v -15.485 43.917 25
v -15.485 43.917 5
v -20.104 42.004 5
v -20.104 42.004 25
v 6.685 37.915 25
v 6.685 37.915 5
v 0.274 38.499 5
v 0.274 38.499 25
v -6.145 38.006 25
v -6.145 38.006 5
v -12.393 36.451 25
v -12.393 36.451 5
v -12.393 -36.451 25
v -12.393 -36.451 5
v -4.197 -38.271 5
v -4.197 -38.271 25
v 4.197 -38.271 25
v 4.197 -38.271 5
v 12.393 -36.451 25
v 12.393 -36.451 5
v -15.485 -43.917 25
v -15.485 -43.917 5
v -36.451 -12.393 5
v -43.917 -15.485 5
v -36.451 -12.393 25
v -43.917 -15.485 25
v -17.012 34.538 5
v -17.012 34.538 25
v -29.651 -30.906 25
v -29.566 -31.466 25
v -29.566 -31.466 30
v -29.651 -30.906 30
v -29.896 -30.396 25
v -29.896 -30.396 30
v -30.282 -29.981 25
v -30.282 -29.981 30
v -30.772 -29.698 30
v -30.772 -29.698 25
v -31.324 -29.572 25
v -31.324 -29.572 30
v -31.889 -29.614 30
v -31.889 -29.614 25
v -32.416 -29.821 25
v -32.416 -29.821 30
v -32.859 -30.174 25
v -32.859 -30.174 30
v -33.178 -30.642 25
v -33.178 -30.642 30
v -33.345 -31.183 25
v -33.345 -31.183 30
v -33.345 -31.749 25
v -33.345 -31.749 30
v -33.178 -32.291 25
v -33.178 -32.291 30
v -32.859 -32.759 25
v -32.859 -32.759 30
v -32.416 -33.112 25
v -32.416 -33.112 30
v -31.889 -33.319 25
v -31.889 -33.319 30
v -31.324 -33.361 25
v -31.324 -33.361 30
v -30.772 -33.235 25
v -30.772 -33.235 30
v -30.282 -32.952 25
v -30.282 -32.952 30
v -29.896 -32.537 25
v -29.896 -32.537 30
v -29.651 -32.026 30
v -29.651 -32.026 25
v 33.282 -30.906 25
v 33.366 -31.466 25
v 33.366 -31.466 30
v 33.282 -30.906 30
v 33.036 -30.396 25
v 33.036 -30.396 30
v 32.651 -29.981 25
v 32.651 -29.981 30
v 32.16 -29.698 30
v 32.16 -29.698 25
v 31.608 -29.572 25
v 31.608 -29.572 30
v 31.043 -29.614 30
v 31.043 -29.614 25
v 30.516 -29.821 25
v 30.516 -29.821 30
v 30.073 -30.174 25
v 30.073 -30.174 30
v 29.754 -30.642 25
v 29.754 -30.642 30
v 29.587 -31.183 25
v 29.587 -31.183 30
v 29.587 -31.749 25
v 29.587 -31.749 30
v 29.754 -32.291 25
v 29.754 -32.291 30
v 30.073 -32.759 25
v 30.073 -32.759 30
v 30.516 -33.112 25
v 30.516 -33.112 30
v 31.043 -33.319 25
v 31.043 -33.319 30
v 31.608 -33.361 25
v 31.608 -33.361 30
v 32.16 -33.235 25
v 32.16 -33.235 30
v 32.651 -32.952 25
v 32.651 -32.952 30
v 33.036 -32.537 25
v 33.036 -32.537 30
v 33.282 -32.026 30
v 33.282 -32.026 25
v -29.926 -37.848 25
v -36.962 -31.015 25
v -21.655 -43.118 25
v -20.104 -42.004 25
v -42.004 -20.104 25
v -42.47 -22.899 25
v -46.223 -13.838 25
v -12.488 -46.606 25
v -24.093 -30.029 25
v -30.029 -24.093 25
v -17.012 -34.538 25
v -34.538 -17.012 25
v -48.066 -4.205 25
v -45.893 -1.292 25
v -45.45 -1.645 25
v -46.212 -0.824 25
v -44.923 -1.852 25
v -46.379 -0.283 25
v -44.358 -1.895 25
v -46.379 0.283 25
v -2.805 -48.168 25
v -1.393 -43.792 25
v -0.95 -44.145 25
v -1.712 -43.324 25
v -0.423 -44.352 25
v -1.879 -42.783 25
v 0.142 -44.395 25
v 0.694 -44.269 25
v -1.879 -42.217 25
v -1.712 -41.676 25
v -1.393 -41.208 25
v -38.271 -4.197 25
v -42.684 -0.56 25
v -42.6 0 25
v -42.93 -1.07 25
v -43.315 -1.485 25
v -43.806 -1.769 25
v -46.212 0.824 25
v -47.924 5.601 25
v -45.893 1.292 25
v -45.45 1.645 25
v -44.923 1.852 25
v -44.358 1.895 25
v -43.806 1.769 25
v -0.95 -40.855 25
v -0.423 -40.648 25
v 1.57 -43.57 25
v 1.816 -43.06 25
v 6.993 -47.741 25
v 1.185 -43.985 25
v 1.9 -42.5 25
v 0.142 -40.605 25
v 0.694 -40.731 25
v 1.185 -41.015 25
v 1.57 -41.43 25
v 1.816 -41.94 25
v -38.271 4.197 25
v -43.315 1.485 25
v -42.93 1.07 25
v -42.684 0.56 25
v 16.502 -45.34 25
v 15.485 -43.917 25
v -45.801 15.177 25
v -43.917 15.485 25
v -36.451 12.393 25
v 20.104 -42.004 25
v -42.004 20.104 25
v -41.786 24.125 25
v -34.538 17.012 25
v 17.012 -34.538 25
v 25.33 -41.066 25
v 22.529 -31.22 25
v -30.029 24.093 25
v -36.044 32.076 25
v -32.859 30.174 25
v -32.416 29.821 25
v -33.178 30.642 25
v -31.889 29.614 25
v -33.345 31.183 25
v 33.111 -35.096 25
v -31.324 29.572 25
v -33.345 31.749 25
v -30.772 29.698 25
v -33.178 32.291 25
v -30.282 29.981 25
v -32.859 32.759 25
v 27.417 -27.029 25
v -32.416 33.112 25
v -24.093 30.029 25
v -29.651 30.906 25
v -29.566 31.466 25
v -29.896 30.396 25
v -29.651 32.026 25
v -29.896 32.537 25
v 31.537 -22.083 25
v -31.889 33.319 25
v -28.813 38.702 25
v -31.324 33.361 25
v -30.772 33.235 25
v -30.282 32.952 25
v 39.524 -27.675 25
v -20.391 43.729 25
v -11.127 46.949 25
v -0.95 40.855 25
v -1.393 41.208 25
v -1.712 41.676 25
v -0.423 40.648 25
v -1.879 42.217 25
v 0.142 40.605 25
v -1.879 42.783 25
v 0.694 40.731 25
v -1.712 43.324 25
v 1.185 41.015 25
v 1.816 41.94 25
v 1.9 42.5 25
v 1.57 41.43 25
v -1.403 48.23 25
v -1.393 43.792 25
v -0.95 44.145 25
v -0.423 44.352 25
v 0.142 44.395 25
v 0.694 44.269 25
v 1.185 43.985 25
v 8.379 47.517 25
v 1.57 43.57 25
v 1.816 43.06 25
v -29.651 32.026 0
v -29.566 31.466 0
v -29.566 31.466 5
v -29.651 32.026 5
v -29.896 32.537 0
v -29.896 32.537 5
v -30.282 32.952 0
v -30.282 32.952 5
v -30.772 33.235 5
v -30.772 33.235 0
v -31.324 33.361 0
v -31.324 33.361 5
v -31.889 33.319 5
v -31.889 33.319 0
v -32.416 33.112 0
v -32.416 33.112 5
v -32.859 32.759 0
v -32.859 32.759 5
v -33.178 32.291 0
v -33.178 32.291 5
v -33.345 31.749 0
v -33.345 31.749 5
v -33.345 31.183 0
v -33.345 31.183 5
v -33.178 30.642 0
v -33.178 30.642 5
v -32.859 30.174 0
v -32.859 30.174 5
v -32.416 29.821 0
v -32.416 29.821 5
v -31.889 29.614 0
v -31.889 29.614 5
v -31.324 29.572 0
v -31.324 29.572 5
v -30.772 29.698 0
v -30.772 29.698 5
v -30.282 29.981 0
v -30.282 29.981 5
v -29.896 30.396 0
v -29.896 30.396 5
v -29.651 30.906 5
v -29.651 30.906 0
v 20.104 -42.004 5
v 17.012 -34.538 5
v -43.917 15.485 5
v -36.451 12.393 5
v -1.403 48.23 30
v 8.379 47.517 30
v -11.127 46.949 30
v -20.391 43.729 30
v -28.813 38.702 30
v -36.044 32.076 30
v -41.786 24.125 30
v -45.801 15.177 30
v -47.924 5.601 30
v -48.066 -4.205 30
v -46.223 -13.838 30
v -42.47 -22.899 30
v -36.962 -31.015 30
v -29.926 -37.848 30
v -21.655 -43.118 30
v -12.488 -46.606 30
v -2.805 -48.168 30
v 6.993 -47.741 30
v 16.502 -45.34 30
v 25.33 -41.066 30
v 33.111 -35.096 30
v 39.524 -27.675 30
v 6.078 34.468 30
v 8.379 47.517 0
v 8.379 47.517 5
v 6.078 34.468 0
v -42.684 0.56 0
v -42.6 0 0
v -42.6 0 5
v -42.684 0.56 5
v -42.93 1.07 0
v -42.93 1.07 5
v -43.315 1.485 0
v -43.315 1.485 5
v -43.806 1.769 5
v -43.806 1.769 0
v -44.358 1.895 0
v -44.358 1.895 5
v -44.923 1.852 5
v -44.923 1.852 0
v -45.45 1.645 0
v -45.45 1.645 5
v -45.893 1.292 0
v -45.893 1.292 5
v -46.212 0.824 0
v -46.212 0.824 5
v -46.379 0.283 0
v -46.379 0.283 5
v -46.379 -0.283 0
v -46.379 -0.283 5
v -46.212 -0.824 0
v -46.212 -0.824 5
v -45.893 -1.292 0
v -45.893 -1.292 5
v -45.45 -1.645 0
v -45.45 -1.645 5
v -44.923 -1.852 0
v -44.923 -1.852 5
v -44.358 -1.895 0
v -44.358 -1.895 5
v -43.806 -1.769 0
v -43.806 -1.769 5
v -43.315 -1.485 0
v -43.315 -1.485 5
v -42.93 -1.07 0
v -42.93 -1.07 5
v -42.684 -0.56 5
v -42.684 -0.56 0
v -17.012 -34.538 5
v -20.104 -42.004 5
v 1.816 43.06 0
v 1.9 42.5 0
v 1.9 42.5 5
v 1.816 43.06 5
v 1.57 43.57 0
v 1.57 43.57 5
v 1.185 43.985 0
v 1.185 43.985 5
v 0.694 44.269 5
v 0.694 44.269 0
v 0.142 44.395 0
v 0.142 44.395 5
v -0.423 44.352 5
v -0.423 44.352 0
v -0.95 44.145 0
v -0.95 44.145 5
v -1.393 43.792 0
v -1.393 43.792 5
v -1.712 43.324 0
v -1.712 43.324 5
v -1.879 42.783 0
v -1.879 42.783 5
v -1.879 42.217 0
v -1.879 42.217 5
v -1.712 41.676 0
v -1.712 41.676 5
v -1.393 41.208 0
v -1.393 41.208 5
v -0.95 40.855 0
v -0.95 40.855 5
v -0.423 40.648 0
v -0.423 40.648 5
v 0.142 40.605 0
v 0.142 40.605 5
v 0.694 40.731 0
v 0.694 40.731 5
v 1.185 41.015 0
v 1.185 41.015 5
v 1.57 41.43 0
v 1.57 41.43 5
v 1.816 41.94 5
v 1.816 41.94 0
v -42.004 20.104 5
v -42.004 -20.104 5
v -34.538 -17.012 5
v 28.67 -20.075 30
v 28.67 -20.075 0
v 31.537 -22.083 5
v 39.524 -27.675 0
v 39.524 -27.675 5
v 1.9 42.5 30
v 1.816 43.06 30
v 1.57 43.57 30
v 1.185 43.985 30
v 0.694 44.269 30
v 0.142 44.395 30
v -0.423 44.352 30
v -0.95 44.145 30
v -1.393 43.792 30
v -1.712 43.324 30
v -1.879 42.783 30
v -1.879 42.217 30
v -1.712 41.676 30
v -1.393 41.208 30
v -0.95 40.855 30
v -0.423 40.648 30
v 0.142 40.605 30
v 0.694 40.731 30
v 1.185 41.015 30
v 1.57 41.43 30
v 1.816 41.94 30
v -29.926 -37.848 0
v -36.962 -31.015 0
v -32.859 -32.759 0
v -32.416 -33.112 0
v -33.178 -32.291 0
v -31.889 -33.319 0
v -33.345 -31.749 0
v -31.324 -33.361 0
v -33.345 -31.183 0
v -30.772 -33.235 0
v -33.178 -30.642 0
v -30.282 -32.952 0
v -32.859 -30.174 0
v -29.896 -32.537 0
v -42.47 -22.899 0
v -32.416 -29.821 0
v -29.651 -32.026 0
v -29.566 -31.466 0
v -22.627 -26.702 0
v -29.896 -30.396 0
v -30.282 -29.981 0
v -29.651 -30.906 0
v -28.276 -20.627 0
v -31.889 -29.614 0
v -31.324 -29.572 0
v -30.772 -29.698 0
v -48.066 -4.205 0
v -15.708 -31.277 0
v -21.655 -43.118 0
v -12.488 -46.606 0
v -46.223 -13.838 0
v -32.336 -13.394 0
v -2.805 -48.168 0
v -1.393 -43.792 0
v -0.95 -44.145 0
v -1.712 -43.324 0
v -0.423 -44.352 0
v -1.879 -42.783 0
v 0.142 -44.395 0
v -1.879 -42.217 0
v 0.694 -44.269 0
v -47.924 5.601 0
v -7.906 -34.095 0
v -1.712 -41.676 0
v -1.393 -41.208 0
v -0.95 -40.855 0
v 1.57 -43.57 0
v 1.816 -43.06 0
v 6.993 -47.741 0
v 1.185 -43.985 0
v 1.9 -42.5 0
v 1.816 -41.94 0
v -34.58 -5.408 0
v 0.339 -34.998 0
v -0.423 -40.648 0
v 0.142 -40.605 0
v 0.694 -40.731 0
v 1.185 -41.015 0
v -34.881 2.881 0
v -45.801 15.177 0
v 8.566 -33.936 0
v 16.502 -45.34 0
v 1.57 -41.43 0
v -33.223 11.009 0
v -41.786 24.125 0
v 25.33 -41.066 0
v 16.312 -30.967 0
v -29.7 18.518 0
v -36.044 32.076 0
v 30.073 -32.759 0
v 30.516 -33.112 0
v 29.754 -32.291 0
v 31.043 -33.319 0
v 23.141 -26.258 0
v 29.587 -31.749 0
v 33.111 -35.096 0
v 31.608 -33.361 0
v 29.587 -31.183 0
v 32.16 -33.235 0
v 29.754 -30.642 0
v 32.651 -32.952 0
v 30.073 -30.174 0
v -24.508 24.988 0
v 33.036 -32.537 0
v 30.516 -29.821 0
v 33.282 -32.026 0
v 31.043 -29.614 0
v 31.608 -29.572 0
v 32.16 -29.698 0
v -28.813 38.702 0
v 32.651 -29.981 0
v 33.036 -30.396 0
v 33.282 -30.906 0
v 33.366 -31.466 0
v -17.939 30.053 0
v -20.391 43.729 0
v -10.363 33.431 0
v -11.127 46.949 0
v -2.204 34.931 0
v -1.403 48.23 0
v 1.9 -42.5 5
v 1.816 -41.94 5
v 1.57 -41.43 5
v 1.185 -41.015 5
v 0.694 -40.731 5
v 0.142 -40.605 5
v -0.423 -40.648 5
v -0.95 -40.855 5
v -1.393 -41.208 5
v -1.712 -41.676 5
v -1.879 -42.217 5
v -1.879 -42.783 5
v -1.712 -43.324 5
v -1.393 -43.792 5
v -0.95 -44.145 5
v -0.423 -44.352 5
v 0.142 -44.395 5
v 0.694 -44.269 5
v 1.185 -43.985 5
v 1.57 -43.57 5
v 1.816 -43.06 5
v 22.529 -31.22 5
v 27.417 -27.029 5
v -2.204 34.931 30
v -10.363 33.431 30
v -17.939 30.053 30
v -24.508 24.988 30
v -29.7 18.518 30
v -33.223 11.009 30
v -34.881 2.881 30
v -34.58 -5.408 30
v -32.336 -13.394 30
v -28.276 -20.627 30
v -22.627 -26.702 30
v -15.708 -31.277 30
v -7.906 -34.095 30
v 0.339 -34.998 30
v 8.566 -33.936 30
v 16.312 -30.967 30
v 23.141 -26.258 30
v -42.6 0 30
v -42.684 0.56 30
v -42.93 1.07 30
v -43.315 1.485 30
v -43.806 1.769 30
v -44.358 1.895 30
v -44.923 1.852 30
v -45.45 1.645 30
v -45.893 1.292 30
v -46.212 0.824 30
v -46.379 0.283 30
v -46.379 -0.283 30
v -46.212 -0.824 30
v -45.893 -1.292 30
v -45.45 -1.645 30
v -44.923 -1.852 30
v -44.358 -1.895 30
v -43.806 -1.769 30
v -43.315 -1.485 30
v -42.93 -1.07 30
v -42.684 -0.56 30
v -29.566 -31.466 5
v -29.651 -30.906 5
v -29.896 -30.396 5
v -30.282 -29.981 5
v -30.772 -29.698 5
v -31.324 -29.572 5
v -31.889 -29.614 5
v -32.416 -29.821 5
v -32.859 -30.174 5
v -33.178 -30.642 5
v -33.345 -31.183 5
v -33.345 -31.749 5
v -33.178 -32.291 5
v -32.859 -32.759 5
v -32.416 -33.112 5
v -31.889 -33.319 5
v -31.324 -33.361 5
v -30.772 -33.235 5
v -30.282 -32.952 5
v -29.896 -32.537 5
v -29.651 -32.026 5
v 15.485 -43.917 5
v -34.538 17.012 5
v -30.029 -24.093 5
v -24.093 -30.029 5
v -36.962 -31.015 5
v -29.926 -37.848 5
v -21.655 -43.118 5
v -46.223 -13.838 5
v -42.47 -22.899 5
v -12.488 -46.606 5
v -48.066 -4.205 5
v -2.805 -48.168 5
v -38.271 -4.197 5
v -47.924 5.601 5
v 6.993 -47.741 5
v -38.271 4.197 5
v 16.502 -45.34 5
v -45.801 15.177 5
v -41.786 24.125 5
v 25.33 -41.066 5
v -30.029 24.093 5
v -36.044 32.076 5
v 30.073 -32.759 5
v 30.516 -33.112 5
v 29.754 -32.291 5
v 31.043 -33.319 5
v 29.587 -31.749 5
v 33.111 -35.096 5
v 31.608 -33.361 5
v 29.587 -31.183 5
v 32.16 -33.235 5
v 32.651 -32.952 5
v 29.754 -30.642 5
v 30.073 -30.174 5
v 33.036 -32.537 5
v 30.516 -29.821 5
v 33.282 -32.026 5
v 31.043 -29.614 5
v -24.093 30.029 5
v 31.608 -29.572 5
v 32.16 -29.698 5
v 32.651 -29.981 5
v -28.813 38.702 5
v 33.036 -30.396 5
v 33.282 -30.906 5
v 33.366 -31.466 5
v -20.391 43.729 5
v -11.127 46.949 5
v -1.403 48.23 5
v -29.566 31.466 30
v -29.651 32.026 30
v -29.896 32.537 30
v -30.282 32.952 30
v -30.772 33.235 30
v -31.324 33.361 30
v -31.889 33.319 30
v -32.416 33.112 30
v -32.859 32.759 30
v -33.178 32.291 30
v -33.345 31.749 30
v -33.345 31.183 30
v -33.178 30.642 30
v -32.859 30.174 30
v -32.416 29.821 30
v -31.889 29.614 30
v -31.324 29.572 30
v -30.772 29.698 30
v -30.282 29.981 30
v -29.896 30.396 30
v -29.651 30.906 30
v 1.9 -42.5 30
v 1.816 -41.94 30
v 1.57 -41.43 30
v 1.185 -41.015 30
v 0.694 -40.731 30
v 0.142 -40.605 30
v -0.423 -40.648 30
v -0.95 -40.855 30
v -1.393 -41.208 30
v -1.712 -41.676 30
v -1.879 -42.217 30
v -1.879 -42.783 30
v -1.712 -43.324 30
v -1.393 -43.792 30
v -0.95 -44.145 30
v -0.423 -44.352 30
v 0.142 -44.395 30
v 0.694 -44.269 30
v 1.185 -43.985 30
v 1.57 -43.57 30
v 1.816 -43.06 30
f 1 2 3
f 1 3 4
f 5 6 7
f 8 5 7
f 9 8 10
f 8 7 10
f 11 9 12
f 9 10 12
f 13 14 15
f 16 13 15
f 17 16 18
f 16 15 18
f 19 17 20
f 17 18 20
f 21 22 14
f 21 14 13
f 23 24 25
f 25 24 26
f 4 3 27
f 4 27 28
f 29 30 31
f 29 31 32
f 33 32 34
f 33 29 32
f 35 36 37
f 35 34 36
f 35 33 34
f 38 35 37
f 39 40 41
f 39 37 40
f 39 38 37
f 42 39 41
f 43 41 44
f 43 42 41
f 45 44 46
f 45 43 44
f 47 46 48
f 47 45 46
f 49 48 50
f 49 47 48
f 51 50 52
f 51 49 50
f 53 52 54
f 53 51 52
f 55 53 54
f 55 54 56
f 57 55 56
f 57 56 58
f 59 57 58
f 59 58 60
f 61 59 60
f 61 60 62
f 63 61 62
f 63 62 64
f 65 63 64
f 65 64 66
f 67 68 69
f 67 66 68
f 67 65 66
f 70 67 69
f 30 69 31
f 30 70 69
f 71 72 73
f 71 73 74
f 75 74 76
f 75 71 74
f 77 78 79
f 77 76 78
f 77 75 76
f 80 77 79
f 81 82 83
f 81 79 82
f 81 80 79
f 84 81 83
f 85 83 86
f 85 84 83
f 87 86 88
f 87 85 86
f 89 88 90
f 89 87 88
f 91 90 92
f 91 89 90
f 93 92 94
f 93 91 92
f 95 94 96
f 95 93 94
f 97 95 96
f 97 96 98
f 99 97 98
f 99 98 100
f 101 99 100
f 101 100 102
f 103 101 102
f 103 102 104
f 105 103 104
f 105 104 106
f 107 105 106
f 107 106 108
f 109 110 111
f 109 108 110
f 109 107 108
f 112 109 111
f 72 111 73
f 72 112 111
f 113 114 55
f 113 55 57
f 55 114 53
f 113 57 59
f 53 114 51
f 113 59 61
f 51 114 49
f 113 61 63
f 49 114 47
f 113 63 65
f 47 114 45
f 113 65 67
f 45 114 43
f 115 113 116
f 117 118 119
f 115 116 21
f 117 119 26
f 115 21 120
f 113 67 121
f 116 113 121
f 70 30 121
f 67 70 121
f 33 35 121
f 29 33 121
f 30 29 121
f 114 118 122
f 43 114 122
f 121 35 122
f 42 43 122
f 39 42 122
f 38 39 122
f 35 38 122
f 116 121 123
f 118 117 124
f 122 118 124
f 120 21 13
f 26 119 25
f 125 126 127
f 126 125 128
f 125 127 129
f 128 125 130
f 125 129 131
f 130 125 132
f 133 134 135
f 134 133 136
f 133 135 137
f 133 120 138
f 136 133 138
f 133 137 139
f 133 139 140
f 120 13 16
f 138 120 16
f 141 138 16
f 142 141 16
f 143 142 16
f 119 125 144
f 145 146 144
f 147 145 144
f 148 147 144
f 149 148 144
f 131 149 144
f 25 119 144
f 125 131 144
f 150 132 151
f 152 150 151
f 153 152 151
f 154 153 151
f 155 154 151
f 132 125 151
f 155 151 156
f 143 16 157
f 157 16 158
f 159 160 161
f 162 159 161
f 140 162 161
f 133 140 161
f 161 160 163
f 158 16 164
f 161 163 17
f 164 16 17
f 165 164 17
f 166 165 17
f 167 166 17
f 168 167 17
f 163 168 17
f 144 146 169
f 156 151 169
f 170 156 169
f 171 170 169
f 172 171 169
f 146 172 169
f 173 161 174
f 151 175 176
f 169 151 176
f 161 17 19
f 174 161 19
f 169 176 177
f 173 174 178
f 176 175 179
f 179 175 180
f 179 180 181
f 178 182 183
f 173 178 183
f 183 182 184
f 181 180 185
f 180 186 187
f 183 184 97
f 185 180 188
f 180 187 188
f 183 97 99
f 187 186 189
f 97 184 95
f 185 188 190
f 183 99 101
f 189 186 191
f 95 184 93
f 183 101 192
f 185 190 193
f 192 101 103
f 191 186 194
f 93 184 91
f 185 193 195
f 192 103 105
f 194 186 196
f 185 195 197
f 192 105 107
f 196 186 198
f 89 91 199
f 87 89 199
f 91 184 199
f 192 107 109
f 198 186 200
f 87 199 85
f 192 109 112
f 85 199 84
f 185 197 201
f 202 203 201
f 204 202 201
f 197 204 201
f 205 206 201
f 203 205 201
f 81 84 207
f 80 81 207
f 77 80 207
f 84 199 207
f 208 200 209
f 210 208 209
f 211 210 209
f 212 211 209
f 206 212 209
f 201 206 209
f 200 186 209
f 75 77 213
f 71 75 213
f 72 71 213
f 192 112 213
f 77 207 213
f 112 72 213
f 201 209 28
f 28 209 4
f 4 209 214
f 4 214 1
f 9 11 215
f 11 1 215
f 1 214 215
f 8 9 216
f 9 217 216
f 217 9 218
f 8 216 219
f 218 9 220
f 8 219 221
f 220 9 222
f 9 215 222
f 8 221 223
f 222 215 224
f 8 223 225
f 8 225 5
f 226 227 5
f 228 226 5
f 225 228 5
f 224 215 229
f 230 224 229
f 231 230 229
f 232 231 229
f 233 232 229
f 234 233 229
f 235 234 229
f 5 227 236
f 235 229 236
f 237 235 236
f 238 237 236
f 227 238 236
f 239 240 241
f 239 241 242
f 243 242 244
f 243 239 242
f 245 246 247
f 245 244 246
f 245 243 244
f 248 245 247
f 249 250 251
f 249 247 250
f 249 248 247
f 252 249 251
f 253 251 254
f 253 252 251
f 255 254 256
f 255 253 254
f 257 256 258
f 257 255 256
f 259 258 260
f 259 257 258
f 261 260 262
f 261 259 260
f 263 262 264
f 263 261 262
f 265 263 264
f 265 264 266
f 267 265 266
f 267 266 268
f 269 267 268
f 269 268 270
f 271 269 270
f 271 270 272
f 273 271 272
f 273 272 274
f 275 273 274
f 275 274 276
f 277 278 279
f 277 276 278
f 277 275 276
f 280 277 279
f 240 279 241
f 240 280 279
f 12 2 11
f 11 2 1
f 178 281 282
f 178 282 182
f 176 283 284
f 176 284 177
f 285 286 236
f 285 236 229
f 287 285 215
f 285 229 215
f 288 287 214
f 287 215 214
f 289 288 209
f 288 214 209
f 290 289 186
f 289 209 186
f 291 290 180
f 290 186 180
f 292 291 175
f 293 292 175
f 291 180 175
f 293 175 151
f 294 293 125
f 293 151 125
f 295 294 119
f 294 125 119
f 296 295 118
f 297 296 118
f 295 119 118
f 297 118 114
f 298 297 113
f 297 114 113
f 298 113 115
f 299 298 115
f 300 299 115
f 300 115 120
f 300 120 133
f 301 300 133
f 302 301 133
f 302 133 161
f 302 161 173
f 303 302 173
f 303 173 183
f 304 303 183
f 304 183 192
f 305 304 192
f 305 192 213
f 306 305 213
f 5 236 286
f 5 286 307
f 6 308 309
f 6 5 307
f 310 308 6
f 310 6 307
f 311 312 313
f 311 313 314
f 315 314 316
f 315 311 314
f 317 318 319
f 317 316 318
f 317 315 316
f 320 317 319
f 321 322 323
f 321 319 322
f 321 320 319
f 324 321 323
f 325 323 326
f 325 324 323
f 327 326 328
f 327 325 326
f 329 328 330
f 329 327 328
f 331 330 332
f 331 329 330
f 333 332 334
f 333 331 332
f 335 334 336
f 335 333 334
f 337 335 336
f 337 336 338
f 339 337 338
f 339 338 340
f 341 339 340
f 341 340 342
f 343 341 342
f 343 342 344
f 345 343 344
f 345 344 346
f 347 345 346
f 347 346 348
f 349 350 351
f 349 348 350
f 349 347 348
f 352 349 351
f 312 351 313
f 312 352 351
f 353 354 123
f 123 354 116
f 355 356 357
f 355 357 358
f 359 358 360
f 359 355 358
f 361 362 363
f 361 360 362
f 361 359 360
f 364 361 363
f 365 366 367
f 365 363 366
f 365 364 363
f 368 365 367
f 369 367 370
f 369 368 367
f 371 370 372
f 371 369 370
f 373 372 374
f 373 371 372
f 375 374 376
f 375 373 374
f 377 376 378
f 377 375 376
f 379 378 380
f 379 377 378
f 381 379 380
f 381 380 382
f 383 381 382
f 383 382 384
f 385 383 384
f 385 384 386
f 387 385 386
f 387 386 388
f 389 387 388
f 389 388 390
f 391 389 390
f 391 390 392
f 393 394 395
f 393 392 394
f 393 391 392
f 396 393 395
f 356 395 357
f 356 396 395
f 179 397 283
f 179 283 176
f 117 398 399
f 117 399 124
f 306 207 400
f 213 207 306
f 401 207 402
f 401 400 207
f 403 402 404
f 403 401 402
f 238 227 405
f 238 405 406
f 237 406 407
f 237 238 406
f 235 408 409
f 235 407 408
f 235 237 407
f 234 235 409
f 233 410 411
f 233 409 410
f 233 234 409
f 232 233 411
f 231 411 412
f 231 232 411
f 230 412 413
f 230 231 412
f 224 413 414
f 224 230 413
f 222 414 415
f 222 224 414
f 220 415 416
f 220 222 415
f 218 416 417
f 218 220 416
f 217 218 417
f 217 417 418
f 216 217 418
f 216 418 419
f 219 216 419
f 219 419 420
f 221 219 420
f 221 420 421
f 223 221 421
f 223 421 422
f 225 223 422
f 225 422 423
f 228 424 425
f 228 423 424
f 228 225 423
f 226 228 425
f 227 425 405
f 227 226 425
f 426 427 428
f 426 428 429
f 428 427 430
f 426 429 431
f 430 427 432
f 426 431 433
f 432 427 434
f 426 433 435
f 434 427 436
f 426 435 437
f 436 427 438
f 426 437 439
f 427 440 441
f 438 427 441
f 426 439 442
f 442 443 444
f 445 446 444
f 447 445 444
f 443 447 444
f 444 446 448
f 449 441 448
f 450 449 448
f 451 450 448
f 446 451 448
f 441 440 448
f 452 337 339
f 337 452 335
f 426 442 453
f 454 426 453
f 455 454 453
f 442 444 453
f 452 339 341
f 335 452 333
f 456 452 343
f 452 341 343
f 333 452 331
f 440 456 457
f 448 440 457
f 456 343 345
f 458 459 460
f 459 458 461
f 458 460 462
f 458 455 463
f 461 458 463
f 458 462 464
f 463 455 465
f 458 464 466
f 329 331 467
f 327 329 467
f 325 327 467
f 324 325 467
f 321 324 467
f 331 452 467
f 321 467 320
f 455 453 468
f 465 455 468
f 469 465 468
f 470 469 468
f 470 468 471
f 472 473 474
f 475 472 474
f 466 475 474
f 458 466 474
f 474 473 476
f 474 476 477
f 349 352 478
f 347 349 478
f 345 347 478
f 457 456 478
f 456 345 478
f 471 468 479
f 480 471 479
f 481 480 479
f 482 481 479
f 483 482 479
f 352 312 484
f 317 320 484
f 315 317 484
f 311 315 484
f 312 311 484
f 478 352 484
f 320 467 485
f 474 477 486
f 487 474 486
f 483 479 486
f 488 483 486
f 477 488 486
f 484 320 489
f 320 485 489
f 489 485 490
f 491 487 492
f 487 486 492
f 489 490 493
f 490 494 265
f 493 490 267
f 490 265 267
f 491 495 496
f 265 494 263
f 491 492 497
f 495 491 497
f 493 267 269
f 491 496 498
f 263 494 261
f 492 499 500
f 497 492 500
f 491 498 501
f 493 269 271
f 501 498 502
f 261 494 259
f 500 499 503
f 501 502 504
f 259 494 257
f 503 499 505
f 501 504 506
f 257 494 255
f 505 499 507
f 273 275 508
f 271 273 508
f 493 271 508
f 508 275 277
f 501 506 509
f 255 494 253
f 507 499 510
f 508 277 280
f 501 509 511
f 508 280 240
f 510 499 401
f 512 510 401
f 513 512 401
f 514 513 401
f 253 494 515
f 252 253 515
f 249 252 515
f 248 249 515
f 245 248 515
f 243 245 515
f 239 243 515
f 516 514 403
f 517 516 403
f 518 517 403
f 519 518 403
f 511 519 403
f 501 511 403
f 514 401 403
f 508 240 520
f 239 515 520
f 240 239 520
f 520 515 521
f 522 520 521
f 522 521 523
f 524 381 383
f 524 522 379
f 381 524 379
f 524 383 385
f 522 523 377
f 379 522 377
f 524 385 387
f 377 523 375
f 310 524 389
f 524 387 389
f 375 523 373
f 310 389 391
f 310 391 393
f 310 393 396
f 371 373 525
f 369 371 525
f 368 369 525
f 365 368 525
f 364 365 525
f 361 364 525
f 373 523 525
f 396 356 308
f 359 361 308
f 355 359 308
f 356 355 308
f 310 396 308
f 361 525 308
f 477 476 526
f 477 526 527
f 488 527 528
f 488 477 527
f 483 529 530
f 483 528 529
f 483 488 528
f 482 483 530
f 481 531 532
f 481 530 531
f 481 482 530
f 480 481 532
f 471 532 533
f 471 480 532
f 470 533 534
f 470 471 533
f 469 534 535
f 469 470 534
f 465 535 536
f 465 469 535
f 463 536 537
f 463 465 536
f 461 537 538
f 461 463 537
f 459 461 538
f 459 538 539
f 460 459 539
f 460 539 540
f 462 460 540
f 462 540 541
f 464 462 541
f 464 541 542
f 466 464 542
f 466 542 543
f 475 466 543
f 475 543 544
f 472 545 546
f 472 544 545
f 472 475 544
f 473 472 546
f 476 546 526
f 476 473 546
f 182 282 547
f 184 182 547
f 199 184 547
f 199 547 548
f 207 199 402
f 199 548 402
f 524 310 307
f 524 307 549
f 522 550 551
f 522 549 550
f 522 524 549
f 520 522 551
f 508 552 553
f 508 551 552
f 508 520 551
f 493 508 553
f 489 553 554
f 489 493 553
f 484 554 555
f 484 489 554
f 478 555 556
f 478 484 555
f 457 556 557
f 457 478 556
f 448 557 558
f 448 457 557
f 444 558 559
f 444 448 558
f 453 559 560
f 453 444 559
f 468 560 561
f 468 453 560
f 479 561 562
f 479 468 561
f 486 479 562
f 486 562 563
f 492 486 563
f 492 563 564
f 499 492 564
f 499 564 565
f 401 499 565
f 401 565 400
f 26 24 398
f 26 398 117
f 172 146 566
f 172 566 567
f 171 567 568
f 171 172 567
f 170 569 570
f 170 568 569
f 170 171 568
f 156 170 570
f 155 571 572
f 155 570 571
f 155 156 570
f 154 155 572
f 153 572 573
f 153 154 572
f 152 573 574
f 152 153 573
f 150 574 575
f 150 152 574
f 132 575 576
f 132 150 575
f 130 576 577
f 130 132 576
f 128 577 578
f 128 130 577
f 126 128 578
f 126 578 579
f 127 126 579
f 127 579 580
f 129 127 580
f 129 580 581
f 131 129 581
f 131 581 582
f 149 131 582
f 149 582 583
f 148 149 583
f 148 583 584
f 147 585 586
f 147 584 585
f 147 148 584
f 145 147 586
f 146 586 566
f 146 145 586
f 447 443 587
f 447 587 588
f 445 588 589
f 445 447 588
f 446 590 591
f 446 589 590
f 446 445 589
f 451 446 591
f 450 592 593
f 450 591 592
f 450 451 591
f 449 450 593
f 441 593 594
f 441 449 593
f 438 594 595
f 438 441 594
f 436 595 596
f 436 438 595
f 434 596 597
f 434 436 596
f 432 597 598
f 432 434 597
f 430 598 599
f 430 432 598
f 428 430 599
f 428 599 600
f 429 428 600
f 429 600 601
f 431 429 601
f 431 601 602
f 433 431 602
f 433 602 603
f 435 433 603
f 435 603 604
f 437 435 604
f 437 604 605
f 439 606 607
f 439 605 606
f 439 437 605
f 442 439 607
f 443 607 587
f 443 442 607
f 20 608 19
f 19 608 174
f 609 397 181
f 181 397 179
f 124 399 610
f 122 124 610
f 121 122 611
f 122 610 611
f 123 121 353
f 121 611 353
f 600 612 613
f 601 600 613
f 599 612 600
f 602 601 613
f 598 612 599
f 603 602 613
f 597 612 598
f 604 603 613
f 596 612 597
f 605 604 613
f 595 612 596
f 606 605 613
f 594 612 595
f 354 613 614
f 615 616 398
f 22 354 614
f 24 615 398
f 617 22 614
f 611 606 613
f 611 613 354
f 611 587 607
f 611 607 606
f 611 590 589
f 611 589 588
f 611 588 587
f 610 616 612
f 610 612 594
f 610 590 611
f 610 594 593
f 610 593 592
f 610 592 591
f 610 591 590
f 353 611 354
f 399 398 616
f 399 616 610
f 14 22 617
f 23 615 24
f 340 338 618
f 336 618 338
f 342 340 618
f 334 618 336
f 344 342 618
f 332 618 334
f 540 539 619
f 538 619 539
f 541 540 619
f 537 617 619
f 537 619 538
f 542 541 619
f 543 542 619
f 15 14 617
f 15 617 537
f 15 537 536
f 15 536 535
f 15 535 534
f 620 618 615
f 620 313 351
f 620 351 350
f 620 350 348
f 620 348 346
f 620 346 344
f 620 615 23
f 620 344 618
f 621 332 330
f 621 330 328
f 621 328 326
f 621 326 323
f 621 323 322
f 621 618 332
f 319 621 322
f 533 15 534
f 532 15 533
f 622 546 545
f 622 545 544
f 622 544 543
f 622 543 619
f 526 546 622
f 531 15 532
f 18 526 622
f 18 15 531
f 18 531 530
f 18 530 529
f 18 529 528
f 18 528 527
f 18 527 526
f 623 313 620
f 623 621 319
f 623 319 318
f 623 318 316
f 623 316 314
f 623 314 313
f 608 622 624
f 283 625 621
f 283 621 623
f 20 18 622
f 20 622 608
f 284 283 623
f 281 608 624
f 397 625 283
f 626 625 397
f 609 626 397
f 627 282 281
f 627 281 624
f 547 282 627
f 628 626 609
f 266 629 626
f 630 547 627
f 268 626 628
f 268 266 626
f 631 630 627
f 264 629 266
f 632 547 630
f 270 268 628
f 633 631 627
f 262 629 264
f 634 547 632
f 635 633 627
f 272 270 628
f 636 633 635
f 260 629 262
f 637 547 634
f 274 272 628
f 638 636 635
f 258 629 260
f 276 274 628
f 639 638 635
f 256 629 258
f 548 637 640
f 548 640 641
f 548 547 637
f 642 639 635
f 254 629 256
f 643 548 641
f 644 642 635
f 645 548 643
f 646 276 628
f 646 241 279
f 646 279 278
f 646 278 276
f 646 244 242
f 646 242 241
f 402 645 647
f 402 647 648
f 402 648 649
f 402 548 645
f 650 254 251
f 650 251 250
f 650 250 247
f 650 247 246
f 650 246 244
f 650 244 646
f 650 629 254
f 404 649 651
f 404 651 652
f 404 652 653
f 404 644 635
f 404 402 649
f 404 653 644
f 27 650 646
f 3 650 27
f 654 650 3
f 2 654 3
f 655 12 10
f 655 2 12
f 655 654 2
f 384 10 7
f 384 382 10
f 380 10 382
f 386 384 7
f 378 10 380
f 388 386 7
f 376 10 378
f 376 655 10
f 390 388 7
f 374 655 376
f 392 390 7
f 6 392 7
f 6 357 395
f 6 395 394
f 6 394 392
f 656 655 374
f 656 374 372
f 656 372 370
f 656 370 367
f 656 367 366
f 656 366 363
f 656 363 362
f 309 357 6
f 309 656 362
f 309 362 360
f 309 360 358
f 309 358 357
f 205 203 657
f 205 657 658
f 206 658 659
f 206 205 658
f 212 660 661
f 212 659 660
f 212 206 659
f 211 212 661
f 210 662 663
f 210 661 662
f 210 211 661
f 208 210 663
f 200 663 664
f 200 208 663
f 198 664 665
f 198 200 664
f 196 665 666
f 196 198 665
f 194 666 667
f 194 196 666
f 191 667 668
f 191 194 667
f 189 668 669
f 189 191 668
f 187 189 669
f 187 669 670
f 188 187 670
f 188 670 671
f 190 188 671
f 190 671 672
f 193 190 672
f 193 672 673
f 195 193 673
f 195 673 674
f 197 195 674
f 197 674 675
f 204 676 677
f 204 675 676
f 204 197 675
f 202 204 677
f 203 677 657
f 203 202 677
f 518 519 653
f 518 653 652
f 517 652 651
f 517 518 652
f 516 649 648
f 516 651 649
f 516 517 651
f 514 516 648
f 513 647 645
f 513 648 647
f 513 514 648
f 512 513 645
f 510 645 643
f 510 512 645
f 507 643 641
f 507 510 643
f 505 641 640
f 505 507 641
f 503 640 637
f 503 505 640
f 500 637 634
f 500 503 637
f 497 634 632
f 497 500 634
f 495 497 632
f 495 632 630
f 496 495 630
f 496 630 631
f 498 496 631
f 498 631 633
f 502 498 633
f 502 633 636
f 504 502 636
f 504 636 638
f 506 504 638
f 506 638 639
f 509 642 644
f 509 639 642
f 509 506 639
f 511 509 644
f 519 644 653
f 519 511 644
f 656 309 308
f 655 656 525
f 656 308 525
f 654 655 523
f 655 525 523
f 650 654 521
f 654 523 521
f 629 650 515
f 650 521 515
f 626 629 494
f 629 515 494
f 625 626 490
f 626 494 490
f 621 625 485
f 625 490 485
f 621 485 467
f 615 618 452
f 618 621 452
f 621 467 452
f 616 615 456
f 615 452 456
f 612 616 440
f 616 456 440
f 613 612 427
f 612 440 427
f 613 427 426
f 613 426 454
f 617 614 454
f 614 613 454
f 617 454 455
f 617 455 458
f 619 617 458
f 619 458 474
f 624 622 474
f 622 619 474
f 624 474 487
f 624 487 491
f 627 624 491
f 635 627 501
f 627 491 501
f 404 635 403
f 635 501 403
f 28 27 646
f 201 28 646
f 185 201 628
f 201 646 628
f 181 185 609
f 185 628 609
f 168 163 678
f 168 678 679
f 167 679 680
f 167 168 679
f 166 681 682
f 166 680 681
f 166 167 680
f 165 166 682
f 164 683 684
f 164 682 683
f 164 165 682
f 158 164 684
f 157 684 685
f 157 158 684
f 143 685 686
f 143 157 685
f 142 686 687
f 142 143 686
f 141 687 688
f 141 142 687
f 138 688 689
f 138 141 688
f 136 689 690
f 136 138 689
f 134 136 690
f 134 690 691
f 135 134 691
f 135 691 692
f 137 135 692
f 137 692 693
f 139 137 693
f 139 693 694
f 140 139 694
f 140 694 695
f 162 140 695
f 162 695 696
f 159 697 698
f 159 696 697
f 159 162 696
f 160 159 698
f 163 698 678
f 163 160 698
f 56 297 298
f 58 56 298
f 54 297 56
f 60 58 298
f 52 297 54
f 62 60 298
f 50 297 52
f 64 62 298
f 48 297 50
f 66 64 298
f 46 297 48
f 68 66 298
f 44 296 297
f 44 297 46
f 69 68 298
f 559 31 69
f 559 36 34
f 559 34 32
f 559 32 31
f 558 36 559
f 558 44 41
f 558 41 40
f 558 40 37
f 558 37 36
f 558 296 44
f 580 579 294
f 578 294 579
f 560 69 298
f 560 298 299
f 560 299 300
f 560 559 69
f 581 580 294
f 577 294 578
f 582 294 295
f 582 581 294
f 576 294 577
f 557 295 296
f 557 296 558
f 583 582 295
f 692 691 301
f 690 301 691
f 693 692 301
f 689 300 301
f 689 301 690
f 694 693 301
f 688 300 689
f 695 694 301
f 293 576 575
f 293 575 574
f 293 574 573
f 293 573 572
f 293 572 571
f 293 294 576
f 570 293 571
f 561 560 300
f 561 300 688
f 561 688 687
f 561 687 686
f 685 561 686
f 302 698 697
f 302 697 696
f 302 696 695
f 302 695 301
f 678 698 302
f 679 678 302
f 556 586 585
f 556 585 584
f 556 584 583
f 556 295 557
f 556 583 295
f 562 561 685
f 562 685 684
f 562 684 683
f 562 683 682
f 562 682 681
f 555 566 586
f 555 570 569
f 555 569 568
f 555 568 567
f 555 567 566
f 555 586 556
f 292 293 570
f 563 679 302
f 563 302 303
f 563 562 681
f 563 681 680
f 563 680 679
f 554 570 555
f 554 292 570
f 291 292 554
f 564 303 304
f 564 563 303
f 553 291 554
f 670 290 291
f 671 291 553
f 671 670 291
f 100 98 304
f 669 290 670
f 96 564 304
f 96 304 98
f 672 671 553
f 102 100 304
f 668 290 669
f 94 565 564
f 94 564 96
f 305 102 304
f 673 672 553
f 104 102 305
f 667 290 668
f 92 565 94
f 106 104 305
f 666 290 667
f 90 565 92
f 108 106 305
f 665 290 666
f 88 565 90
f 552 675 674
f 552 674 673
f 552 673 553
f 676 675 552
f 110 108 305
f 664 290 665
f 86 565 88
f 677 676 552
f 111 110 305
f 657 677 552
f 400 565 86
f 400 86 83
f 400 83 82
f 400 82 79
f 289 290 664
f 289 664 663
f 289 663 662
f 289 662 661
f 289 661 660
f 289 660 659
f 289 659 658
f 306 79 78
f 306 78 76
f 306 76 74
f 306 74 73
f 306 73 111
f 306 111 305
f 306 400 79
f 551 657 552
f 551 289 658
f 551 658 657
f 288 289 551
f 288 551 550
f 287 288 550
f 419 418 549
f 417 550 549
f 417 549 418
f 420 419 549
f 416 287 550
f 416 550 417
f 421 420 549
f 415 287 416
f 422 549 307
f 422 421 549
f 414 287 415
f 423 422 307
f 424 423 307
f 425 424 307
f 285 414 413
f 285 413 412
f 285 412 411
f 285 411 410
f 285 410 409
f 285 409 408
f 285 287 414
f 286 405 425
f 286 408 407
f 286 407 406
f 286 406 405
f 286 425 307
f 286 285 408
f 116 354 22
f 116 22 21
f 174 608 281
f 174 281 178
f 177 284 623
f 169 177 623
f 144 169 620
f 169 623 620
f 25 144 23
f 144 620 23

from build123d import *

# Parameters (mm, degrees)
SKETCH_1_R               = 48.25
EXTRUDE_1_DEPTH          = 30
CUT_EXTRUDE_1_DEPTH      = 75.539419102
CUT_EXTRUDE_1_DEPTH_BACK = 75.539419102
CUT_EXTRUDE_2_DEPTH      = 75.539419102
CUT_EXTRUDE_2_DEPTH_BACK = 75.539419102
CUT_EXTRUDE_3_DEPTH      = 75.539419102
CUT_EXTRUDE_3_DEPTH_BACK = 75.539419102
SKETCH_3_R               = 1.9
CUT_EXTRUDE_START        = 5
SKETCH_4_OUTSIDE_W       = 116.544
SKETCH_4_OUTSIDE_H       = 125.27
SKETCH_4_OUTSIDE_R       = 38.5
CUT_EXTRUDE_4_DEPTH      = 20
RIB_4_REACH              = 76.539
SKETCH_8_WALL_W          = 171.078838204
SKETCH_8_WALL_H          = 5
PATTERN_CIRCULAR_1_COUNT = 5
PATTERN_CIRCULAR_1_ANGLE = 180


with BuildPart() as part:
    # 草图1 → 凸台-拉伸1 (new body)
    with BuildSketch(Plane.XY):
        Circle(SKETCH_1_R)
    extrude(amount=EXTRUDE_1_DEPTH)

    # 草图2 → 切除-拉伸1 (cut, two sides: drawn at the far end of the back side and taken through both)
    with BuildSketch(Plane.XY.offset(30).offset(-CUT_EXTRUDE_1_DEPTH_BACK)):
        with BuildLine():
            Line((28.67032155, -20.075175272), (0, 0))
            Line((0, 0), (6.077686218, 34.468271355))
            ThreePointArc((6.077686218, 34.468271355), (-32.335783638, -13.393920133), (28.67032155, -20.075175272))
        make_face()
    extrude(amount=CUT_EXTRUDE_1_DEPTH + CUT_EXTRUDE_1_DEPTH_BACK, mode=Mode.SUBTRACT)

    # 草图2<3> → 切除-拉伸2 (cut, two sides: drawn at the far end of the back side and taken through both)
    with BuildSketch(Plane.XY.offset(30).offset(-CUT_EXTRUDE_2_DEPTH_BACK)):
        with BuildLine():
            Line((0, 0), (39.524086137, -27.675063054))
            ThreePointArc((39.524086137, -27.675063054), (44.577187444, 18.464475612), (8.378524572, 47.516974083))
            Line((8.378524572, 47.516974083), (0, 0))
        make_face()
    extrude(amount=CUT_EXTRUDE_2_DEPTH + CUT_EXTRUDE_2_DEPTH_BACK, mode=Mode.SUBTRACT)

    # 草图3 → 切除-拉伸3 (cut, two sides: drawn at the far end of the back side and taken through both)
    with BuildSketch(Plane.XY.offset(-CUT_EXTRUDE_3_DEPTH_BACK)):
        with Locations((31.466251763, 31.466251763)):
            Circle(SKETCH_3_R)
        with Locations((44.5, 0)):
            Circle(SKETCH_3_R)
        with Locations((31.466251763, -31.466251763)):
            Circle(SKETCH_3_R)
        with Locations((-31.466251763, -31.466251763)):
            Circle(SKETCH_3_R)
        with Locations((0, 42.5)):
            Circle(SKETCH_3_R)
        with Locations((0, -42.5)):
            Circle(SKETCH_3_R)
        with Locations((-44.5, 0)):
            Circle(SKETCH_3_R)
        with Locations((-31.466251763, 31.466251763)):
            Circle(SKETCH_3_R)
    extrude(amount=CUT_EXTRUDE_3_DEPTH + CUT_EXTRUDE_3_DEPTH_BACK, mode=Mode.SUBTRACT)

    # 草图4 outside → 切除-拉伸4 (cut)
    with BuildSketch(Plane.XY.offset(CUT_EXTRUDE_START)):
        with Locations((-4.363, 0)):
            Rectangle(SKETCH_4_OUTSIDE_W, SKETCH_4_OUTSIDE_H)
        Circle(SKETCH_4_OUTSIDE_R, mode=Mode.SUBTRACT)
    extrude(amount=CUT_EXTRUDE_4_DEPTH, mode=Mode.SUBTRACT)

    # 草图8 wall → 筋4 (add, up to next)
    with BuildSketch(Plane(origin=(17.794779605, -42.960398262, 15), x_dir=(0, 0, 1), z_dir=(0.382683432365, -0.923879532511, 0)), mode=Mode.PRIVATE) as rib_4_sk1:
        Rectangle(SKETCH_8_WALL_W, SKETCH_8_WALL_H)
    rib_4_tool1 = extrude(rib_4_sk1.sketch, amount=-RIB_4_REACH, mode=Mode.PRIVATE) - part.part
    rib_4 = rib_4_tool1.solids().sort_by_distance((17.794779605, -42.960398262, 15))[0]
    add(rib_4)

    # 阵列(圆周)1: 筋4 ×5 about axis
    pattern_circular_1_axis = Axis((0, 0, 25), (0, 0, -1))
    for i in range(1, PATTERN_CIRCULAR_1_COUNT):
        add(rib_4.rotate(pattern_circular_1_axis, i * PATTERN_CIRCULAR_1_ANGLE / (PATTERN_CIRCULAR_1_COUNT - 1)))


solid = part.part
